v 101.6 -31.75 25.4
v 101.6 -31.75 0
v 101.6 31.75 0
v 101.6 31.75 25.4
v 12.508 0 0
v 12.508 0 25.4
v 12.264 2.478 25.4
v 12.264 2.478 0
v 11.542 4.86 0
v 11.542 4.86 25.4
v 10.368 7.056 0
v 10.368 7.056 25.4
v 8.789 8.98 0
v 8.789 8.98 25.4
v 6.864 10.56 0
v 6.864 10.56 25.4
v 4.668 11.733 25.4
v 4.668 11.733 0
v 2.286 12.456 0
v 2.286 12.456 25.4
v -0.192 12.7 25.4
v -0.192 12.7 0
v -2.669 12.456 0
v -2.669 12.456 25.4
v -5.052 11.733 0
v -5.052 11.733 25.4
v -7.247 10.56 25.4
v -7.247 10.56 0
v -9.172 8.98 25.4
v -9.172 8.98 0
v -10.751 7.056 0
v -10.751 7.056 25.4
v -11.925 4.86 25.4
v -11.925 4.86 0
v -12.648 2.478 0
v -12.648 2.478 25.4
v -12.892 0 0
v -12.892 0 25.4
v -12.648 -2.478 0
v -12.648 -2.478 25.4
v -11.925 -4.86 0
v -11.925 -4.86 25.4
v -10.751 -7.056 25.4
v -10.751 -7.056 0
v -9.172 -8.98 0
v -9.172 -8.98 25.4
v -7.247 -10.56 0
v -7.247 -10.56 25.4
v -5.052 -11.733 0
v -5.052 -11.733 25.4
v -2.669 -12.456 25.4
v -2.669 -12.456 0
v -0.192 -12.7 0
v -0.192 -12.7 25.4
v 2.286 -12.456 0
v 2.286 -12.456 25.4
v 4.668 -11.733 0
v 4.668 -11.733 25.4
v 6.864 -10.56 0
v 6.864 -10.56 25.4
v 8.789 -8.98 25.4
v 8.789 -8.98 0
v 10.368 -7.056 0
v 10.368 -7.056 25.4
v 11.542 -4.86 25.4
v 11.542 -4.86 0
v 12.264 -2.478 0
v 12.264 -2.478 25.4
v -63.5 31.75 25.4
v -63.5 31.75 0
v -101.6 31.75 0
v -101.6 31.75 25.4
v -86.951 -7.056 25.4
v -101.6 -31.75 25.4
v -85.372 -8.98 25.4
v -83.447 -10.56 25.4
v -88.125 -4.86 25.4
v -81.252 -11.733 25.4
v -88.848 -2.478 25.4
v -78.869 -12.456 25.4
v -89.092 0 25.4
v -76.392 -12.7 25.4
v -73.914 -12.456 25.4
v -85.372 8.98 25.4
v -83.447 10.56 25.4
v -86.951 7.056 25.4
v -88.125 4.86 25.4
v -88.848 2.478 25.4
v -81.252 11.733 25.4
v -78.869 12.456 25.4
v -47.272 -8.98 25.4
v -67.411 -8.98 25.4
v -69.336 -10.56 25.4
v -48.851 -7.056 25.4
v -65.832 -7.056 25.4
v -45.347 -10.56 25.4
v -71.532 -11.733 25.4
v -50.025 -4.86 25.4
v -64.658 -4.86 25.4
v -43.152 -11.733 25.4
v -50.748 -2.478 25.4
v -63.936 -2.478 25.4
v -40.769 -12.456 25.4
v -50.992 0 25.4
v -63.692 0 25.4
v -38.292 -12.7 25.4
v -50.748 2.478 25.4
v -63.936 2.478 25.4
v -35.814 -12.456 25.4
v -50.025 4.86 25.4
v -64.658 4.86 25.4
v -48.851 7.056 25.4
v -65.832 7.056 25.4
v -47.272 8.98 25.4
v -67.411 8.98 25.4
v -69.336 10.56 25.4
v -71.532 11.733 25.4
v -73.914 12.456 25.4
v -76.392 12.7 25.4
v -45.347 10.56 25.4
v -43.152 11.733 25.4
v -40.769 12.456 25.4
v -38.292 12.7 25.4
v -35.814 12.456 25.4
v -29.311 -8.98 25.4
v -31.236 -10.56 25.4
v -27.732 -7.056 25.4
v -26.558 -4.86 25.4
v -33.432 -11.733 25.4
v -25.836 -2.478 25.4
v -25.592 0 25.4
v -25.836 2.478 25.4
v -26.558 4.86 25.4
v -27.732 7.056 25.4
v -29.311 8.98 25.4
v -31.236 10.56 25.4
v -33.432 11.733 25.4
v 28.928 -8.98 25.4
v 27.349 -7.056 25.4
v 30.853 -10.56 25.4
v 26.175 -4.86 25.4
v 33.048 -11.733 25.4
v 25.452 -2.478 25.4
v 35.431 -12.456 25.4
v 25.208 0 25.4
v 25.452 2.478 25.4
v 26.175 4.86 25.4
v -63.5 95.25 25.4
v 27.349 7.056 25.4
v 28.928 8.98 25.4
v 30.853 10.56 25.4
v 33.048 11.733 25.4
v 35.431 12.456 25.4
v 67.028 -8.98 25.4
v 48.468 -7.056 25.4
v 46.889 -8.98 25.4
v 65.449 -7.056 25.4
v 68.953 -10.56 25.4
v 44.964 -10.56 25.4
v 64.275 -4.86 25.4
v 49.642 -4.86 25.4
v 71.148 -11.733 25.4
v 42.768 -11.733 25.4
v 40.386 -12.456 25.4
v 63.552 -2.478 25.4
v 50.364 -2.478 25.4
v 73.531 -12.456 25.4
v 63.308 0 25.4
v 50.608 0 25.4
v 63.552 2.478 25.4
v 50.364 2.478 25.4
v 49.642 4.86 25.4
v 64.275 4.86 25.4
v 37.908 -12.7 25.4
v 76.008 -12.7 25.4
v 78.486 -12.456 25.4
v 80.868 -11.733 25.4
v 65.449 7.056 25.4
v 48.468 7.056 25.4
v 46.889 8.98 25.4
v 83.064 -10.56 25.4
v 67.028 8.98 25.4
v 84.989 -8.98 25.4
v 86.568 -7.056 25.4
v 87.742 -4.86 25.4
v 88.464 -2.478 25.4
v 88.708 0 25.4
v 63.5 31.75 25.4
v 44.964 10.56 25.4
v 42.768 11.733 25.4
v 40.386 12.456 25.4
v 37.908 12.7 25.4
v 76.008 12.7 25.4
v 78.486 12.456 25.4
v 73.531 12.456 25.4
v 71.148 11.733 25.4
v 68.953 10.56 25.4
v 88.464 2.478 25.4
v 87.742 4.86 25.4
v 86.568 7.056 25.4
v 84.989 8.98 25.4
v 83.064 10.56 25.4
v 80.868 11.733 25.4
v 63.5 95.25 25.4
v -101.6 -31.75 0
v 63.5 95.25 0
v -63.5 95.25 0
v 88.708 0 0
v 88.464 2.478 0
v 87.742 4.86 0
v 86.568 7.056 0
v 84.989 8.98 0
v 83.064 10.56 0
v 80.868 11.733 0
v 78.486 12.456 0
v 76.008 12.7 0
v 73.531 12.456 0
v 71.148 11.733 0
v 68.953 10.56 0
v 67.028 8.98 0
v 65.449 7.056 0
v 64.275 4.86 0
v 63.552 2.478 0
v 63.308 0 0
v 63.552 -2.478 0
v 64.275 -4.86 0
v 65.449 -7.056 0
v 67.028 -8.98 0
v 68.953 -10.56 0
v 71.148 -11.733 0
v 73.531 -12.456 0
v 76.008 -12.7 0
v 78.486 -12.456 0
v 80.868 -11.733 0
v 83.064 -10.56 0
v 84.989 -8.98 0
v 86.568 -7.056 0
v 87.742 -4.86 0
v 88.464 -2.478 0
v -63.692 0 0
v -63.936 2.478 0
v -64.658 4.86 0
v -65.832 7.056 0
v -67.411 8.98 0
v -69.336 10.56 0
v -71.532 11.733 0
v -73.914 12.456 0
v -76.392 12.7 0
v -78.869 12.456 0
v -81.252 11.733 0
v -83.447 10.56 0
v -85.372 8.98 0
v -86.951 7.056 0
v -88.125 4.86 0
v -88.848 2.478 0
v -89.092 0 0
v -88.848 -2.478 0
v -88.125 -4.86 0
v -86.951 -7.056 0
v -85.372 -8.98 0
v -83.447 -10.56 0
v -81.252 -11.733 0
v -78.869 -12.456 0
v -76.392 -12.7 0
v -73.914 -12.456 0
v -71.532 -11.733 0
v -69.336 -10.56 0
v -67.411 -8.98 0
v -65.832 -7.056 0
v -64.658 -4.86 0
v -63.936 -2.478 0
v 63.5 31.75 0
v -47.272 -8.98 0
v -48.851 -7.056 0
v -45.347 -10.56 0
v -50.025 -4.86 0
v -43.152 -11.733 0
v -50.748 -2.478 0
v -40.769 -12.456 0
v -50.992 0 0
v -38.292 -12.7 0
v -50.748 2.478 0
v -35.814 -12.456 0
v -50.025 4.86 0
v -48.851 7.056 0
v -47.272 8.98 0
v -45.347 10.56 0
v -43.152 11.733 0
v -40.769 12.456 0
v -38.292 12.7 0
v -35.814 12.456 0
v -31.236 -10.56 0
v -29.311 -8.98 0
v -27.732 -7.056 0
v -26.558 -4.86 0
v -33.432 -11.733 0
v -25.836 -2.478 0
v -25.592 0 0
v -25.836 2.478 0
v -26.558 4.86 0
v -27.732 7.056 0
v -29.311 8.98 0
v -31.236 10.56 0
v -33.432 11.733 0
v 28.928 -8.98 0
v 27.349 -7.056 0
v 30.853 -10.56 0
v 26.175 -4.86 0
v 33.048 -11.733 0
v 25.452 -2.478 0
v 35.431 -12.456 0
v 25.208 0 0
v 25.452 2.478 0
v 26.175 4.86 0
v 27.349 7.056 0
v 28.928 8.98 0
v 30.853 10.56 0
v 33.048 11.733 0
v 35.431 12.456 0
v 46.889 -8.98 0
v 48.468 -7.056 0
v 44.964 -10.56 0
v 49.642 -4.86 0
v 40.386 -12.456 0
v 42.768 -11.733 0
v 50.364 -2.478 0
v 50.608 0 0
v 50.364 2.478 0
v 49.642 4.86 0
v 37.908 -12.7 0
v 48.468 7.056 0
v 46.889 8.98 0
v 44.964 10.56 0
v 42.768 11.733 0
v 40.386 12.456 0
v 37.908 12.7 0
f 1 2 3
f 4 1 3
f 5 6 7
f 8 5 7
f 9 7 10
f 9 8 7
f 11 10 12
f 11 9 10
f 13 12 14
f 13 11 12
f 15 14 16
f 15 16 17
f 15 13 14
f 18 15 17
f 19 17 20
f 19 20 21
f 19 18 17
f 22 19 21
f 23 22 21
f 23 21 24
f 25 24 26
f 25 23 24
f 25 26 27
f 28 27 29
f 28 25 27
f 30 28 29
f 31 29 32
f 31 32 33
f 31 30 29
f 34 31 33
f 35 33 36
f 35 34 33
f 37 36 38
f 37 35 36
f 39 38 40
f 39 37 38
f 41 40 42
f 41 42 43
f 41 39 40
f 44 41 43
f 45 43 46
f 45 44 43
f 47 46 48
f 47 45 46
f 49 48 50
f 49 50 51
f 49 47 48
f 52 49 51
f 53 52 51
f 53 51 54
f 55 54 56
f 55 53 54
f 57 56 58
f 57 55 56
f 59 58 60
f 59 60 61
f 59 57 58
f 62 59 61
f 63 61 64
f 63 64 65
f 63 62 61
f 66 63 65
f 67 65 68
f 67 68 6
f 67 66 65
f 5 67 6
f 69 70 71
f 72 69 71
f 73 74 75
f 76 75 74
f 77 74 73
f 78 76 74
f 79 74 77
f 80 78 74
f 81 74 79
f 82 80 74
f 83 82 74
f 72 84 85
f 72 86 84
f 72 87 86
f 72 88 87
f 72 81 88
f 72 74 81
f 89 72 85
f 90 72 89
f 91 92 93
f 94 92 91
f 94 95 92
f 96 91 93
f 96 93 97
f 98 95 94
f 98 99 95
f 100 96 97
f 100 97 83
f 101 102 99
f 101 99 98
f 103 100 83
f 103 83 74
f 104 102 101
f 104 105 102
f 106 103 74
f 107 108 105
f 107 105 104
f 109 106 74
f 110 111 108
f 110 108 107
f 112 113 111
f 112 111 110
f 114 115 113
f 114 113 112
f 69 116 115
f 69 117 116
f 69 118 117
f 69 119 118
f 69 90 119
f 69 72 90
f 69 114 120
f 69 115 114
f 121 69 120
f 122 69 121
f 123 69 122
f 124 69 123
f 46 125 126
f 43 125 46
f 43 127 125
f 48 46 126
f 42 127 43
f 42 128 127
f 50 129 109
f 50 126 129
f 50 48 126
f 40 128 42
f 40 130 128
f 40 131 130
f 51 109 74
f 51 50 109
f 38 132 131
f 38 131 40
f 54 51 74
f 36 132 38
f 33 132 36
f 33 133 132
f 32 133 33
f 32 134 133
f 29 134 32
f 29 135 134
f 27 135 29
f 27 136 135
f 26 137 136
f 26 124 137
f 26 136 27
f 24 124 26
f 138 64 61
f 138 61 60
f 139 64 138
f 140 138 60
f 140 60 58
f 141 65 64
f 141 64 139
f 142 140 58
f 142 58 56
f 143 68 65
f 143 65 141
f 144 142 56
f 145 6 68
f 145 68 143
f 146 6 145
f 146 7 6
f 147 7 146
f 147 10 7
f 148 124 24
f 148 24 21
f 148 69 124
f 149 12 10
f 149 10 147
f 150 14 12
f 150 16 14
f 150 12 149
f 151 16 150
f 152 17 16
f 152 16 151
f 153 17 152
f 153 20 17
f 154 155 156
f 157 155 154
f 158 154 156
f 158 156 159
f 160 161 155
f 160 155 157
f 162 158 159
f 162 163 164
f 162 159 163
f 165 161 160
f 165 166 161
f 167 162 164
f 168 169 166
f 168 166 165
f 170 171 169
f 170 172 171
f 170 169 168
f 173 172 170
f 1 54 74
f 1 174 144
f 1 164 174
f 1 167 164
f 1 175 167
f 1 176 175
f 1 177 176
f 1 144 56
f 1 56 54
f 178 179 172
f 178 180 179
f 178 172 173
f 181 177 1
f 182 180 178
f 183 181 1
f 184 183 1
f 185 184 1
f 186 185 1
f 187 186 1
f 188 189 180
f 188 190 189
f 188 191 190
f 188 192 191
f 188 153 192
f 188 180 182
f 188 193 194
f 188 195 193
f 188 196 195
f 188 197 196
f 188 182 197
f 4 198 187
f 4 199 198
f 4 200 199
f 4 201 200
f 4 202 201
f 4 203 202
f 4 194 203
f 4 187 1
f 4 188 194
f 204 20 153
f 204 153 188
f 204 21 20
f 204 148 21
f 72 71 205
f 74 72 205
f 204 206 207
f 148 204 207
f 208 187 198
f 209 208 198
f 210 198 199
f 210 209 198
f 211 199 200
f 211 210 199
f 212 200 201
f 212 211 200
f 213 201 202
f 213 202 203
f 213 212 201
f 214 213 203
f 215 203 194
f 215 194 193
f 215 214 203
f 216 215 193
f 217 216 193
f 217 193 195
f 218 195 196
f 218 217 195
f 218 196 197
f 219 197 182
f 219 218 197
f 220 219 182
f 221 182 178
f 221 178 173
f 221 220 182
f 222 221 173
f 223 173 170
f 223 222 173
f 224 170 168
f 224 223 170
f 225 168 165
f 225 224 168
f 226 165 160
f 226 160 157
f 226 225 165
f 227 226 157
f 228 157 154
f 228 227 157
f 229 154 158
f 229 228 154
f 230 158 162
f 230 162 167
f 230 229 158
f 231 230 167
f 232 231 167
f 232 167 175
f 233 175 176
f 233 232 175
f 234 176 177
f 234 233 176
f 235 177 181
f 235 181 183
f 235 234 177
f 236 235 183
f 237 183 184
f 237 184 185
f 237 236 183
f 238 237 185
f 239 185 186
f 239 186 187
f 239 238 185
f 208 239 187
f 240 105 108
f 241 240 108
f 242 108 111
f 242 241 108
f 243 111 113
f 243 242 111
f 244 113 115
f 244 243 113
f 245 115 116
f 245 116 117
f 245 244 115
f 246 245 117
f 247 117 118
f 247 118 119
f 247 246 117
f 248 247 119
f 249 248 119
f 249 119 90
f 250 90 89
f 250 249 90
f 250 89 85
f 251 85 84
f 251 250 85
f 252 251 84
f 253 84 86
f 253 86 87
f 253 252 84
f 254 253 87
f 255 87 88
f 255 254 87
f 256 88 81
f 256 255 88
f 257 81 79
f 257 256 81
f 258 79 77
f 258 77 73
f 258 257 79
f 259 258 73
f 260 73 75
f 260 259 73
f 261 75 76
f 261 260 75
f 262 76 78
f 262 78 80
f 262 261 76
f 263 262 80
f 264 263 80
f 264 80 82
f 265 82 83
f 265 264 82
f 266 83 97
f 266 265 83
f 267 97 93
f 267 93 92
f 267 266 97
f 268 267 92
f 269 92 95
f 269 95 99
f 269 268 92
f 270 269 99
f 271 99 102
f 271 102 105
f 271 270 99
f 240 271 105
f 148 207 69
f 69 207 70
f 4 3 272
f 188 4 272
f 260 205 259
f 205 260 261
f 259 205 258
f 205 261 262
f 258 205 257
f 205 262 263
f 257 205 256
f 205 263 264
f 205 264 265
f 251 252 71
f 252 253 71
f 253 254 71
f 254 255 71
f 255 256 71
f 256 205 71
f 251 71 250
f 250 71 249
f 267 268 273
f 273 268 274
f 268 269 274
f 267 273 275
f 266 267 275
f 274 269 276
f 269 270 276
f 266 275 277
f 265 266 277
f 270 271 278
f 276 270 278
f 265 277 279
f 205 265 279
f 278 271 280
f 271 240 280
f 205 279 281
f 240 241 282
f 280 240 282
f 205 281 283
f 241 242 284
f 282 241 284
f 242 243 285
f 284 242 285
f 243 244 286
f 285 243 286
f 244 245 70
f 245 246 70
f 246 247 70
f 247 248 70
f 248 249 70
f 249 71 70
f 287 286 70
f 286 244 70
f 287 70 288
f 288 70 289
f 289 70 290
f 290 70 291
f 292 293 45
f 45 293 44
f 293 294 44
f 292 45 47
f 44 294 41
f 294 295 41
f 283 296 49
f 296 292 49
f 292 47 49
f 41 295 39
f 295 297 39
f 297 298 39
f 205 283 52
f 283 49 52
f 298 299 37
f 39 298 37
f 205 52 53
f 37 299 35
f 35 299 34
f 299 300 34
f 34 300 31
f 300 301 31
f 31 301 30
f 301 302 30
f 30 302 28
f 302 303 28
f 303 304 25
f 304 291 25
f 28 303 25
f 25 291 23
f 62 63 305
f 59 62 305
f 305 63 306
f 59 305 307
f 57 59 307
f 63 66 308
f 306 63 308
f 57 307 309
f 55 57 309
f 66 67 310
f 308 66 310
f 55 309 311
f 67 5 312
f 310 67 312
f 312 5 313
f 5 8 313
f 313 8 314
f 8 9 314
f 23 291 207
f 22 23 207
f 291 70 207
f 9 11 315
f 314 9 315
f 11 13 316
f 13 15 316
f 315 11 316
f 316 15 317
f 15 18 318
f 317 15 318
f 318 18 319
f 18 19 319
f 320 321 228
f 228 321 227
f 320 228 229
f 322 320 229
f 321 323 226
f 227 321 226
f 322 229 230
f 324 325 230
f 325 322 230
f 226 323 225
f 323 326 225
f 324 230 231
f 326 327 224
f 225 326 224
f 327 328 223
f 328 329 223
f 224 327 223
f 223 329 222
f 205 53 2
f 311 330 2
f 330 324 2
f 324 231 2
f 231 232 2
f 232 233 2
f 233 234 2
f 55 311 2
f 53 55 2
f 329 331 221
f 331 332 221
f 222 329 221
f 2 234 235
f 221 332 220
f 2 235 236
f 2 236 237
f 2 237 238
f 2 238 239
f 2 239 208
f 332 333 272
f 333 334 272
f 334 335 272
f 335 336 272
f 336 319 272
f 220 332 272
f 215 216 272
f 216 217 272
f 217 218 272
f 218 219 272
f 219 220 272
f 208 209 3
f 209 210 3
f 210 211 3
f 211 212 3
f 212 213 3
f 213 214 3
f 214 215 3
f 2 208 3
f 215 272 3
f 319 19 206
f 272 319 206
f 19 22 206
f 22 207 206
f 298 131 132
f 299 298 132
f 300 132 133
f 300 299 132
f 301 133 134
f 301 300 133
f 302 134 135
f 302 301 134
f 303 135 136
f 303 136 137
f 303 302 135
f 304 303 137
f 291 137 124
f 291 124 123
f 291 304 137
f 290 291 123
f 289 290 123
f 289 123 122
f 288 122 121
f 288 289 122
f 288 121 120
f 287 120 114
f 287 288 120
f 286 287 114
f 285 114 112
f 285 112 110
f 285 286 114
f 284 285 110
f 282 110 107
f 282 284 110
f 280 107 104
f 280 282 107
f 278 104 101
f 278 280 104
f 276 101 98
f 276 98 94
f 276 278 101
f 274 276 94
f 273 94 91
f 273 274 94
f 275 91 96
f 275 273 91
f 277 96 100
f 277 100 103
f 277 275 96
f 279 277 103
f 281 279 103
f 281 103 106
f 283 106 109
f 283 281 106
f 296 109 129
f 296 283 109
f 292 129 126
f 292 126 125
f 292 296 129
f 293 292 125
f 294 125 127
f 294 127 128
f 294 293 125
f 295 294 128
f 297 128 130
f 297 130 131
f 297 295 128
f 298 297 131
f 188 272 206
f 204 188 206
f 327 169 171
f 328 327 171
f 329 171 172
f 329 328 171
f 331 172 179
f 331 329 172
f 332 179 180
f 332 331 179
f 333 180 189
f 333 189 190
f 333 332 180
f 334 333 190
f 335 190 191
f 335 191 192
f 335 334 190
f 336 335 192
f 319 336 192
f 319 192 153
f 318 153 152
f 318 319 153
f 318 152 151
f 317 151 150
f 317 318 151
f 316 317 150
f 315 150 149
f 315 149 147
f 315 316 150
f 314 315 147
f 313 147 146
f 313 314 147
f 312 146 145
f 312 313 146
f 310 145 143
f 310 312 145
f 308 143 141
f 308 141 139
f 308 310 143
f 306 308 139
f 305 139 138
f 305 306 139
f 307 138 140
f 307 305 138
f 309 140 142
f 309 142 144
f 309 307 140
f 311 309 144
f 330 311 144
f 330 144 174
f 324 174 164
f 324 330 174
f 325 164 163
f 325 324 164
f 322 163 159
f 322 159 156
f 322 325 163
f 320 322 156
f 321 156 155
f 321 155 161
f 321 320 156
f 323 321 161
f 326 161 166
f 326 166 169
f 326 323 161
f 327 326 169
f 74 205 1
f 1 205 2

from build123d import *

# Parameters (mm, degrees)
F0_R     = 12.7
F1_DEPTH = 25.4


with BuildPart() as f1:
    # F0 (on Top) → F1 (new body)
    with BuildSketch(Plane.XY):
        Polygon((101.6, -31.75), (101.6, 31.75), (63.5, 31.75), (0, 31.75), (-63.5, 31.75), (-101.6, 31.75), (-101.6, -31.75), align=None)
        with Locations((-76.391645, 0)):
            Circle(F0_R, mode=Mode.SUBTRACT)
        with Locations((-38.291645, 0)):
            Circle(F0_R, mode=Mode.SUBTRACT)
        with Locations((-0.191645, 0)):
            Circle(F0_R, mode=Mode.SUBTRACT)
        with Locations((37.908355, 0)):
            Circle(F0_R, mode=Mode.SUBTRACT)
        with Locations((76.008355, 0)):
            Circle(F0_R, mode=Mode.SUBTRACT)
        Polygon((0, 31.75), (63.5, 31.75), (63.5, 95.25), (-63.5, 95.25), (-63.5, 31.75), align=None)
    extrude(amount=F1_DEPTH)


solid = f1.part
